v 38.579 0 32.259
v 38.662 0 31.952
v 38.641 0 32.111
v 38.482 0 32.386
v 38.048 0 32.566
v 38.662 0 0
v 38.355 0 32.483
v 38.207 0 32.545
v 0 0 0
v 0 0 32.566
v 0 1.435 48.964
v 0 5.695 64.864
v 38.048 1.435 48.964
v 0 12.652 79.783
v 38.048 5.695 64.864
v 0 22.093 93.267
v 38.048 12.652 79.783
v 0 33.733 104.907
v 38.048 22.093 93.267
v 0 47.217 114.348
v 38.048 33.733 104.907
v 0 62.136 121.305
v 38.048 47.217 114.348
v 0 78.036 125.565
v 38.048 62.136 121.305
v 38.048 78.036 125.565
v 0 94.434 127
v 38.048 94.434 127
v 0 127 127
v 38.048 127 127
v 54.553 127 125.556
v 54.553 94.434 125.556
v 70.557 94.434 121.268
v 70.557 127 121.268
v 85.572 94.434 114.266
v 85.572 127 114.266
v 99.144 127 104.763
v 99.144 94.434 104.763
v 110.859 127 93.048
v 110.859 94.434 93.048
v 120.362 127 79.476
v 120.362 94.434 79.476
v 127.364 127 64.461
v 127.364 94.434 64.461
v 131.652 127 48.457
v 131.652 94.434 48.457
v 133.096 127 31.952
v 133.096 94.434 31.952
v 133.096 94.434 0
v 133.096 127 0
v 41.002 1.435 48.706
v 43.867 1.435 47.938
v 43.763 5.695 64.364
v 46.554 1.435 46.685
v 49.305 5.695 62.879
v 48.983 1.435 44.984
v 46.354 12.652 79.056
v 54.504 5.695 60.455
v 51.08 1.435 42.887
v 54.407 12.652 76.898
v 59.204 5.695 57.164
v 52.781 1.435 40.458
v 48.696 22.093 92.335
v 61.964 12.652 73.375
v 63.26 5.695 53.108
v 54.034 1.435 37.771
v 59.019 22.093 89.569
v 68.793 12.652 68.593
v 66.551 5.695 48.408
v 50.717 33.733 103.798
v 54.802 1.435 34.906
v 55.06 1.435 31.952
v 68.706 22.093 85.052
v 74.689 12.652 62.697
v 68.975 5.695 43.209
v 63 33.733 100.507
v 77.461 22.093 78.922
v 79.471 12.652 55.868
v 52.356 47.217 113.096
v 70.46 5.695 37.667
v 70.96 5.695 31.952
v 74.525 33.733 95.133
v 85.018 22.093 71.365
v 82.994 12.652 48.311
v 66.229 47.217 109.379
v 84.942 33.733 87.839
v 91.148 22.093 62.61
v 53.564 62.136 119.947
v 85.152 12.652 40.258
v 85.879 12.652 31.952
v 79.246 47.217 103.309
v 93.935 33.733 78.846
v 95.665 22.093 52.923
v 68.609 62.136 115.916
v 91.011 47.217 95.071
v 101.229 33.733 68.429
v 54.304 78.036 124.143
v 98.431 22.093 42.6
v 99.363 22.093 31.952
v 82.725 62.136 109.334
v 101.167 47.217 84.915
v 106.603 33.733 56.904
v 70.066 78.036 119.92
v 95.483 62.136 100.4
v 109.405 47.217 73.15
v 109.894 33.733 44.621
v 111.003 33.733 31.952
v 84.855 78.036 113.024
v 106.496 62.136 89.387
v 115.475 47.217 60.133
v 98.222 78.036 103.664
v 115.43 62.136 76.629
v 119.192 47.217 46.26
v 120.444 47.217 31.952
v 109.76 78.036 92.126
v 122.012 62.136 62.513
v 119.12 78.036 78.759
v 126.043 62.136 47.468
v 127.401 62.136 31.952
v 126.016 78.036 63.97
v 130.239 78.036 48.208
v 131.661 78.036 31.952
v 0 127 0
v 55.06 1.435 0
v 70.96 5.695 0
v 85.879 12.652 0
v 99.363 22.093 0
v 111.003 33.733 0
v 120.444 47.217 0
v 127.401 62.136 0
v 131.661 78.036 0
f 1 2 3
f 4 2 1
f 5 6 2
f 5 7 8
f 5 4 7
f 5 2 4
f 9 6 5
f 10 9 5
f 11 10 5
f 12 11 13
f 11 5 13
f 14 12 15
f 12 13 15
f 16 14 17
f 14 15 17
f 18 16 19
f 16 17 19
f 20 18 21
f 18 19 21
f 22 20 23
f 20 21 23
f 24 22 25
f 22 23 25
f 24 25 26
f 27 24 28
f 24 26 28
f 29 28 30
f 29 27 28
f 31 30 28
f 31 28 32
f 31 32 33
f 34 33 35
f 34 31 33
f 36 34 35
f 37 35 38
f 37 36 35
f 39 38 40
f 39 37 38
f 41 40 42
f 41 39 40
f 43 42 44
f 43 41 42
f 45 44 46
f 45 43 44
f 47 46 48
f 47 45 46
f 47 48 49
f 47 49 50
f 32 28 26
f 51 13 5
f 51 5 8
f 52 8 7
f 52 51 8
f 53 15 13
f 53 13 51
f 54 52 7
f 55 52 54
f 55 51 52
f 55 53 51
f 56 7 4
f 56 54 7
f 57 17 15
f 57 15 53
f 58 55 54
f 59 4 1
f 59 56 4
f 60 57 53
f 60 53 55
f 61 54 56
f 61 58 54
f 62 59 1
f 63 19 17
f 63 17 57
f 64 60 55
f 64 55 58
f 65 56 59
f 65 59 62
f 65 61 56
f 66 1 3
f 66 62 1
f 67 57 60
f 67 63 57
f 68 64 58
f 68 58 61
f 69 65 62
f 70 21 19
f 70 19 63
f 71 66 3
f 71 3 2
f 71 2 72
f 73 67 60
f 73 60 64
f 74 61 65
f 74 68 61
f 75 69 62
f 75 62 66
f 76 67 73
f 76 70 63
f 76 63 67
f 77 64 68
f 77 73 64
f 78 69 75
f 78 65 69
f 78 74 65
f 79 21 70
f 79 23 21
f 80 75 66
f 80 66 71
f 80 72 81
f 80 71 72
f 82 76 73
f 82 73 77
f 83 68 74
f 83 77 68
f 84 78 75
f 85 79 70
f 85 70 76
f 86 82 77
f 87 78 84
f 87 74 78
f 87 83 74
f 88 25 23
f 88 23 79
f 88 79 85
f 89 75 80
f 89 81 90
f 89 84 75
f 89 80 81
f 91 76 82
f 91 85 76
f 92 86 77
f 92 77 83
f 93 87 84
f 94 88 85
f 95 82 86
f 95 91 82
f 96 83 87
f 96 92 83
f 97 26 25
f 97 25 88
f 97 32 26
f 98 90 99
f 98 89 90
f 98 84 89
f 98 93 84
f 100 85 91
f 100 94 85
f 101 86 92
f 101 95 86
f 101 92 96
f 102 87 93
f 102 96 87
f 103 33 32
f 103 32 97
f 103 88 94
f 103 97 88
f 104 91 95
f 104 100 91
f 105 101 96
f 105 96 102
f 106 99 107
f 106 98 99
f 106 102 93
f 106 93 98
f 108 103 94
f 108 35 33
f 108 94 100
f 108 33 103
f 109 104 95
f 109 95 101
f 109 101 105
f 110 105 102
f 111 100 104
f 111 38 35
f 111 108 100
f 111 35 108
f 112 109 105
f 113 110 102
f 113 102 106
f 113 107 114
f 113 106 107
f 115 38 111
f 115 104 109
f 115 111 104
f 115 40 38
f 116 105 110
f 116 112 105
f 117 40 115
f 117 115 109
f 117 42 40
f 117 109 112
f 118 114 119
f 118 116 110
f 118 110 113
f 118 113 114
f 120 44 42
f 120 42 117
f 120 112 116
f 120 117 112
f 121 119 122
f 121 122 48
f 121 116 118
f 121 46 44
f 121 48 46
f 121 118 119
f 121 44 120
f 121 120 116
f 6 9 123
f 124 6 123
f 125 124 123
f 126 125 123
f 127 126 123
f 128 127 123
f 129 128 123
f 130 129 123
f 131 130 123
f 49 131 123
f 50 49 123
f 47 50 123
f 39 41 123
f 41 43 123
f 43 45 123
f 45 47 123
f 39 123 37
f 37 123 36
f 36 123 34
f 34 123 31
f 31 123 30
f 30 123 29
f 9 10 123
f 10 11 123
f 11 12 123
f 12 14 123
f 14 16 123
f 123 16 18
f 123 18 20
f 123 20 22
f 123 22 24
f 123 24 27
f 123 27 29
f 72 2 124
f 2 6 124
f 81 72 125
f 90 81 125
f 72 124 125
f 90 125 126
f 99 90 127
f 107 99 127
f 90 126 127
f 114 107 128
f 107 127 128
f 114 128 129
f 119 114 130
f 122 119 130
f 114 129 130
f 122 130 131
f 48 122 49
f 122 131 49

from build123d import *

# Parameters (mm, degrees)
F0_W     = 127
F0_H     = 127
F1_DEPTH = 133.096
F2_R     = 95.0475879506
F3_R     = 94.4343777058


with BuildPart() as f1:
    # F0 (on Right) → F1 (new body)
    with BuildSketch(Plane.YZ):
        with Locations((63.5, 63.5)):
            Rectangle(F0_W, F0_H)
    extrude(amount=F1_DEPTH)

    # F2
    f2_edges = [f1.edges().sort_by_distance(p)[0] for p in [
        (133.096, 63.5, 127),
    ]]
    fillet(f2_edges, radius=F2_R)

    # F3
    f3_edges = [f1.edges().sort_by_distance(p)[0] for p in [
        (105.257206, 0, 99.161206),
    ]]
    fillet(f3_edges, radius=F3_R)


solid = f1.part
